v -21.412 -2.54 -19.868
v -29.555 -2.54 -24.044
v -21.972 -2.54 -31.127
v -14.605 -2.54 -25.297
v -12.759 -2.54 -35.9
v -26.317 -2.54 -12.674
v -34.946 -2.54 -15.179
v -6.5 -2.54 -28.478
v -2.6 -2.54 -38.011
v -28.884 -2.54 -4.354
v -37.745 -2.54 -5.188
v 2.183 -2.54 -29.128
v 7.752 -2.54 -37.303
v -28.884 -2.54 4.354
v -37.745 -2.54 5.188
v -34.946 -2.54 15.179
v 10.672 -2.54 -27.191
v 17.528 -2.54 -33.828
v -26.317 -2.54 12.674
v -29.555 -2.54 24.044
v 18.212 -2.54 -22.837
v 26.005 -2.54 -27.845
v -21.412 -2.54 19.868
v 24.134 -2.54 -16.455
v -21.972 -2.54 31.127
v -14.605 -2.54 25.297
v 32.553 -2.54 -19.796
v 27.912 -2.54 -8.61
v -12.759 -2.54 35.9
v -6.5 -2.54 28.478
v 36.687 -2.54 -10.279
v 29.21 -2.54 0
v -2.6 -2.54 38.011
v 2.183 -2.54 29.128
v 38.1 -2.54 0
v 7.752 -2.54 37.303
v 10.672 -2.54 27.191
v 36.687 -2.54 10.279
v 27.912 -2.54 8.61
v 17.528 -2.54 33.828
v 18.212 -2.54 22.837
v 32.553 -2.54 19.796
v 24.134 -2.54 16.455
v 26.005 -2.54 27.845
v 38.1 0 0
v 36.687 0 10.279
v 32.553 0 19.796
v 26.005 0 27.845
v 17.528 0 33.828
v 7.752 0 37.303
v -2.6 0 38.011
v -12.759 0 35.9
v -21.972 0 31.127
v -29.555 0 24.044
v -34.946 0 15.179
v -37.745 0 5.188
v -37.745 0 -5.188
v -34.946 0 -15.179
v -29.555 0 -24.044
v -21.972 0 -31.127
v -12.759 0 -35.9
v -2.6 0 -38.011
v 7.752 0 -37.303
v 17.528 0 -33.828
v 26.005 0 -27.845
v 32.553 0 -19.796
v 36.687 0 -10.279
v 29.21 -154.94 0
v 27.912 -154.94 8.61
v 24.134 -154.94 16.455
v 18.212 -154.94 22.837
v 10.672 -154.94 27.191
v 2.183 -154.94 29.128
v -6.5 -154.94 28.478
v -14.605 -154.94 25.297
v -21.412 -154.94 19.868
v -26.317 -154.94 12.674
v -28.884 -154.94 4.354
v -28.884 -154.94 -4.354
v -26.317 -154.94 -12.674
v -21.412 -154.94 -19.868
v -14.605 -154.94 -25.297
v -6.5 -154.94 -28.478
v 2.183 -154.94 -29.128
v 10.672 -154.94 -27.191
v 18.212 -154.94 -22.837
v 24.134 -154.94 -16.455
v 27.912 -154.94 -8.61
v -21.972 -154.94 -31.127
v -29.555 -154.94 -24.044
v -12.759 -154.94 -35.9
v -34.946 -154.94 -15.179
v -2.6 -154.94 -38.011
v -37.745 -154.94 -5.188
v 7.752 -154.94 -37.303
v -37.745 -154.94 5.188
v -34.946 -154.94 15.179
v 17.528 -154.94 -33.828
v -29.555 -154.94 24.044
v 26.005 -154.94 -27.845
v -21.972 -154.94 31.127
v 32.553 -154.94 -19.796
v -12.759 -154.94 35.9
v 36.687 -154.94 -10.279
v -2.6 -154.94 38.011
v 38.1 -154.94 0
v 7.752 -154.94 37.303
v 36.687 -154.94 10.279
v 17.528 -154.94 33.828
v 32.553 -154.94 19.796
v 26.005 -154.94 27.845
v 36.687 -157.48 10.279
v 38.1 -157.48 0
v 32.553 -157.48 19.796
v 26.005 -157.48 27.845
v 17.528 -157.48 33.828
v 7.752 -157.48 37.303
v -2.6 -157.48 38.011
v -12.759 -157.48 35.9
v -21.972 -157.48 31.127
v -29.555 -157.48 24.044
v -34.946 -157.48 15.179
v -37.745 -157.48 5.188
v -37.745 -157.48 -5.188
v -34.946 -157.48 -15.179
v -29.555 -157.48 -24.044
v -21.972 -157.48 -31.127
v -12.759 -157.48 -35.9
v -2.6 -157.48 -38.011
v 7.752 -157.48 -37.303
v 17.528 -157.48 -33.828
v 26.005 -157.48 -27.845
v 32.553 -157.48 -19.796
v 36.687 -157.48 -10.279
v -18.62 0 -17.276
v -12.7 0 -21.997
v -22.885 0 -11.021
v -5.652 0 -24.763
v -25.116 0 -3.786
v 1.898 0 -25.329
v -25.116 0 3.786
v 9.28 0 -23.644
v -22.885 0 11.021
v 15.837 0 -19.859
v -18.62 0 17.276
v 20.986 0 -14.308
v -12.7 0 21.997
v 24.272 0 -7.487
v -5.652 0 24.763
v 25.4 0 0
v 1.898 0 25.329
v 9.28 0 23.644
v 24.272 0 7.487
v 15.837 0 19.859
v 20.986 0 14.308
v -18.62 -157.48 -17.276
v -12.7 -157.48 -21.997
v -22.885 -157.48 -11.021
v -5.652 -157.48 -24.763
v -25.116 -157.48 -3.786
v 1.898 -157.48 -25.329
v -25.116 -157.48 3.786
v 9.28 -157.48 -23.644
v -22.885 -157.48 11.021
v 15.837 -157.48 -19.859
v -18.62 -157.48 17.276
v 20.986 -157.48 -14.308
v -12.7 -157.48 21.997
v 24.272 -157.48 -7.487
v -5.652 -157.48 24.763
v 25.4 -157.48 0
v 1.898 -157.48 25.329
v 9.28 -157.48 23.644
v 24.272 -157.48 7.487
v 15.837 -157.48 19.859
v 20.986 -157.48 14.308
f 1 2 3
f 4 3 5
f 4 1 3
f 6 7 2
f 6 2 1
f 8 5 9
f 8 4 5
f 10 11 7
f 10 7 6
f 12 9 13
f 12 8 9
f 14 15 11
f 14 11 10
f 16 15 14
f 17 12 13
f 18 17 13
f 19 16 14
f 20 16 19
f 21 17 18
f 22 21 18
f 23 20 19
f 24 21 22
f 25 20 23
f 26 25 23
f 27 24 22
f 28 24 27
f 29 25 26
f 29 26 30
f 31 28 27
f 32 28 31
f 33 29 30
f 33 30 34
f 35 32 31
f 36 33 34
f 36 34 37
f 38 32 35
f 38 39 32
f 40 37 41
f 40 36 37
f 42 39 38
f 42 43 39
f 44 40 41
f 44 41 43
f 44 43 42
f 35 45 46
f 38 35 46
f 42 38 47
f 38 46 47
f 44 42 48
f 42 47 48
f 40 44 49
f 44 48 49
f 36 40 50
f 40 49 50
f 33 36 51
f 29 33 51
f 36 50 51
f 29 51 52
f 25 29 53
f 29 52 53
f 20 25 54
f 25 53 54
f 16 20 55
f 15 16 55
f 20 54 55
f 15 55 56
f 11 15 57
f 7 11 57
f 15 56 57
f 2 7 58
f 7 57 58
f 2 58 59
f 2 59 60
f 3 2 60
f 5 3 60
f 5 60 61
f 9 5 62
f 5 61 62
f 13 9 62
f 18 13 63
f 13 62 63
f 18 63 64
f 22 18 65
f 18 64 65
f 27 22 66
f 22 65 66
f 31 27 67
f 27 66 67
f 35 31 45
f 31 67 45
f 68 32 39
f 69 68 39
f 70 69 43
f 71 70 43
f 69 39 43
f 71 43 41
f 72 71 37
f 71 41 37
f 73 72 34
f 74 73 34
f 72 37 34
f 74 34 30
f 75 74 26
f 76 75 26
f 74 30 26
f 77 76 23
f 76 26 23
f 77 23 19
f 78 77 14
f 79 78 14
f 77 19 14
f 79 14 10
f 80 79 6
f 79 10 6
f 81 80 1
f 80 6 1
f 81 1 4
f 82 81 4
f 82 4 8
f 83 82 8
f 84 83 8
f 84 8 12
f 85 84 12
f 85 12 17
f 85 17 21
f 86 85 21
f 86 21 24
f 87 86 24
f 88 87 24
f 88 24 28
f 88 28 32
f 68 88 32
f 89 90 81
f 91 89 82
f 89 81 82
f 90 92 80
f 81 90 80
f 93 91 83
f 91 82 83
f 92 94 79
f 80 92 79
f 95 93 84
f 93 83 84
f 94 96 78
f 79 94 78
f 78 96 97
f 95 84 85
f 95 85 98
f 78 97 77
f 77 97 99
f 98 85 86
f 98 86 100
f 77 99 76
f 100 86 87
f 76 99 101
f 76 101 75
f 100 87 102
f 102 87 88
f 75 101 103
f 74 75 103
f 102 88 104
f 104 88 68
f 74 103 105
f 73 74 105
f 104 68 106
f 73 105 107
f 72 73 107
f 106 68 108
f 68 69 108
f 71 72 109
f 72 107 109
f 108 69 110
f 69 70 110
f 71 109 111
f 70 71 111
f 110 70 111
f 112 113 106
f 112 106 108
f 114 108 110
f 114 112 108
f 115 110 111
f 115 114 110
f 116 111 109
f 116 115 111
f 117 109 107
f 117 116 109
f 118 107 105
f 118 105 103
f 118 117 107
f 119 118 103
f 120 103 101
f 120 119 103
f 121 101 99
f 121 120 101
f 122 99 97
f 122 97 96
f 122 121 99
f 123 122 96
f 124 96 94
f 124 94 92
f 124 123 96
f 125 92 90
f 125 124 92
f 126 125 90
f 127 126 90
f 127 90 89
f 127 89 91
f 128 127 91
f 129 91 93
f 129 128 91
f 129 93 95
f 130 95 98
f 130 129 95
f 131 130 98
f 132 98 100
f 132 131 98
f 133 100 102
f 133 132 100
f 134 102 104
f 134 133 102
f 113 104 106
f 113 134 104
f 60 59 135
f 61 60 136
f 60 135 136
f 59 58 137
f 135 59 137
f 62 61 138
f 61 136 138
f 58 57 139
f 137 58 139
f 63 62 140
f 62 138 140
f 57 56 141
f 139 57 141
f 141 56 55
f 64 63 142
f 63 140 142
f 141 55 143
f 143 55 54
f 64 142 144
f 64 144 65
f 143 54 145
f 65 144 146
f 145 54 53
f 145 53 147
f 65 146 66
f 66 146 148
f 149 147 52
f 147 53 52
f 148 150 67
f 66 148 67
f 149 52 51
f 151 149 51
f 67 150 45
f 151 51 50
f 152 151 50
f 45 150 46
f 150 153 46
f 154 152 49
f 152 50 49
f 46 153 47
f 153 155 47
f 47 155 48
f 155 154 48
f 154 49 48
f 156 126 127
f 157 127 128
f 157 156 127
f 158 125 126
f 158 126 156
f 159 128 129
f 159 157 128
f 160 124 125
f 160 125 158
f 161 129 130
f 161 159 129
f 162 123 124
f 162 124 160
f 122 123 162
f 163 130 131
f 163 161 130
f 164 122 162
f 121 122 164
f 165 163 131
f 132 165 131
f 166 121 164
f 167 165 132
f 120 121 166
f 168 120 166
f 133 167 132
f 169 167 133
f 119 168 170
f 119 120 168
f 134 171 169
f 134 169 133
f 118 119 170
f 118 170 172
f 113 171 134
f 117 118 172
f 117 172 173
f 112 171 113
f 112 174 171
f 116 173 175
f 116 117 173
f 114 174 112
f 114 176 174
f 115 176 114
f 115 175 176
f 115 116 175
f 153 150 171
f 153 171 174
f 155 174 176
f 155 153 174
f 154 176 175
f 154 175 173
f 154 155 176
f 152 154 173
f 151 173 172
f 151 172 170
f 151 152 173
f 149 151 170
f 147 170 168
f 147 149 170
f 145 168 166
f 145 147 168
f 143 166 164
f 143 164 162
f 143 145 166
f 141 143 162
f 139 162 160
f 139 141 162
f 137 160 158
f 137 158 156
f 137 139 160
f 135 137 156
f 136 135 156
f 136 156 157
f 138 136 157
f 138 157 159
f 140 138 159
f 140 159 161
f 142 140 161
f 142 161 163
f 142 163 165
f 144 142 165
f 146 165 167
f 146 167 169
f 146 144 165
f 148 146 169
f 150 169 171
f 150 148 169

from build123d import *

# Parameters (mm, degrees)
F0_R     = 38.1
F0_R_2   = 29.21
F1_DEPTH = 2.54
F0_R_3   = 25.4
F2_DEPTH = 157.48
F3_R     = 38.1
F3_R_2   = 29.21
F4_DEPTH = 2.54


with BuildPart() as f1:
    # F0 (on Front) → F1 (new body)
    with BuildSketch(Plane.XZ):
        Circle(F0_R)
        Circle(F0_R_2, mode=Mode.SUBTRACT)
    extrude(amount=F1_DEPTH)

    # F0 (on Front) → F2 (join)
    with BuildSketch(Plane.XZ):
        Circle(F0_R_2)
        Circle(F0_R_3, mode=Mode.SUBTRACT)
    extrude(amount=F2_DEPTH)

    # F3 (on face) → F4 (join)
    with BuildSketch(Plane.XZ.offset(157.48)):
        Circle(F3_R)
        Circle(F3_R_2, mode=Mode.SUBTRACT)
    extrude(amount=-F4_DEPTH)


solid = f1.part
